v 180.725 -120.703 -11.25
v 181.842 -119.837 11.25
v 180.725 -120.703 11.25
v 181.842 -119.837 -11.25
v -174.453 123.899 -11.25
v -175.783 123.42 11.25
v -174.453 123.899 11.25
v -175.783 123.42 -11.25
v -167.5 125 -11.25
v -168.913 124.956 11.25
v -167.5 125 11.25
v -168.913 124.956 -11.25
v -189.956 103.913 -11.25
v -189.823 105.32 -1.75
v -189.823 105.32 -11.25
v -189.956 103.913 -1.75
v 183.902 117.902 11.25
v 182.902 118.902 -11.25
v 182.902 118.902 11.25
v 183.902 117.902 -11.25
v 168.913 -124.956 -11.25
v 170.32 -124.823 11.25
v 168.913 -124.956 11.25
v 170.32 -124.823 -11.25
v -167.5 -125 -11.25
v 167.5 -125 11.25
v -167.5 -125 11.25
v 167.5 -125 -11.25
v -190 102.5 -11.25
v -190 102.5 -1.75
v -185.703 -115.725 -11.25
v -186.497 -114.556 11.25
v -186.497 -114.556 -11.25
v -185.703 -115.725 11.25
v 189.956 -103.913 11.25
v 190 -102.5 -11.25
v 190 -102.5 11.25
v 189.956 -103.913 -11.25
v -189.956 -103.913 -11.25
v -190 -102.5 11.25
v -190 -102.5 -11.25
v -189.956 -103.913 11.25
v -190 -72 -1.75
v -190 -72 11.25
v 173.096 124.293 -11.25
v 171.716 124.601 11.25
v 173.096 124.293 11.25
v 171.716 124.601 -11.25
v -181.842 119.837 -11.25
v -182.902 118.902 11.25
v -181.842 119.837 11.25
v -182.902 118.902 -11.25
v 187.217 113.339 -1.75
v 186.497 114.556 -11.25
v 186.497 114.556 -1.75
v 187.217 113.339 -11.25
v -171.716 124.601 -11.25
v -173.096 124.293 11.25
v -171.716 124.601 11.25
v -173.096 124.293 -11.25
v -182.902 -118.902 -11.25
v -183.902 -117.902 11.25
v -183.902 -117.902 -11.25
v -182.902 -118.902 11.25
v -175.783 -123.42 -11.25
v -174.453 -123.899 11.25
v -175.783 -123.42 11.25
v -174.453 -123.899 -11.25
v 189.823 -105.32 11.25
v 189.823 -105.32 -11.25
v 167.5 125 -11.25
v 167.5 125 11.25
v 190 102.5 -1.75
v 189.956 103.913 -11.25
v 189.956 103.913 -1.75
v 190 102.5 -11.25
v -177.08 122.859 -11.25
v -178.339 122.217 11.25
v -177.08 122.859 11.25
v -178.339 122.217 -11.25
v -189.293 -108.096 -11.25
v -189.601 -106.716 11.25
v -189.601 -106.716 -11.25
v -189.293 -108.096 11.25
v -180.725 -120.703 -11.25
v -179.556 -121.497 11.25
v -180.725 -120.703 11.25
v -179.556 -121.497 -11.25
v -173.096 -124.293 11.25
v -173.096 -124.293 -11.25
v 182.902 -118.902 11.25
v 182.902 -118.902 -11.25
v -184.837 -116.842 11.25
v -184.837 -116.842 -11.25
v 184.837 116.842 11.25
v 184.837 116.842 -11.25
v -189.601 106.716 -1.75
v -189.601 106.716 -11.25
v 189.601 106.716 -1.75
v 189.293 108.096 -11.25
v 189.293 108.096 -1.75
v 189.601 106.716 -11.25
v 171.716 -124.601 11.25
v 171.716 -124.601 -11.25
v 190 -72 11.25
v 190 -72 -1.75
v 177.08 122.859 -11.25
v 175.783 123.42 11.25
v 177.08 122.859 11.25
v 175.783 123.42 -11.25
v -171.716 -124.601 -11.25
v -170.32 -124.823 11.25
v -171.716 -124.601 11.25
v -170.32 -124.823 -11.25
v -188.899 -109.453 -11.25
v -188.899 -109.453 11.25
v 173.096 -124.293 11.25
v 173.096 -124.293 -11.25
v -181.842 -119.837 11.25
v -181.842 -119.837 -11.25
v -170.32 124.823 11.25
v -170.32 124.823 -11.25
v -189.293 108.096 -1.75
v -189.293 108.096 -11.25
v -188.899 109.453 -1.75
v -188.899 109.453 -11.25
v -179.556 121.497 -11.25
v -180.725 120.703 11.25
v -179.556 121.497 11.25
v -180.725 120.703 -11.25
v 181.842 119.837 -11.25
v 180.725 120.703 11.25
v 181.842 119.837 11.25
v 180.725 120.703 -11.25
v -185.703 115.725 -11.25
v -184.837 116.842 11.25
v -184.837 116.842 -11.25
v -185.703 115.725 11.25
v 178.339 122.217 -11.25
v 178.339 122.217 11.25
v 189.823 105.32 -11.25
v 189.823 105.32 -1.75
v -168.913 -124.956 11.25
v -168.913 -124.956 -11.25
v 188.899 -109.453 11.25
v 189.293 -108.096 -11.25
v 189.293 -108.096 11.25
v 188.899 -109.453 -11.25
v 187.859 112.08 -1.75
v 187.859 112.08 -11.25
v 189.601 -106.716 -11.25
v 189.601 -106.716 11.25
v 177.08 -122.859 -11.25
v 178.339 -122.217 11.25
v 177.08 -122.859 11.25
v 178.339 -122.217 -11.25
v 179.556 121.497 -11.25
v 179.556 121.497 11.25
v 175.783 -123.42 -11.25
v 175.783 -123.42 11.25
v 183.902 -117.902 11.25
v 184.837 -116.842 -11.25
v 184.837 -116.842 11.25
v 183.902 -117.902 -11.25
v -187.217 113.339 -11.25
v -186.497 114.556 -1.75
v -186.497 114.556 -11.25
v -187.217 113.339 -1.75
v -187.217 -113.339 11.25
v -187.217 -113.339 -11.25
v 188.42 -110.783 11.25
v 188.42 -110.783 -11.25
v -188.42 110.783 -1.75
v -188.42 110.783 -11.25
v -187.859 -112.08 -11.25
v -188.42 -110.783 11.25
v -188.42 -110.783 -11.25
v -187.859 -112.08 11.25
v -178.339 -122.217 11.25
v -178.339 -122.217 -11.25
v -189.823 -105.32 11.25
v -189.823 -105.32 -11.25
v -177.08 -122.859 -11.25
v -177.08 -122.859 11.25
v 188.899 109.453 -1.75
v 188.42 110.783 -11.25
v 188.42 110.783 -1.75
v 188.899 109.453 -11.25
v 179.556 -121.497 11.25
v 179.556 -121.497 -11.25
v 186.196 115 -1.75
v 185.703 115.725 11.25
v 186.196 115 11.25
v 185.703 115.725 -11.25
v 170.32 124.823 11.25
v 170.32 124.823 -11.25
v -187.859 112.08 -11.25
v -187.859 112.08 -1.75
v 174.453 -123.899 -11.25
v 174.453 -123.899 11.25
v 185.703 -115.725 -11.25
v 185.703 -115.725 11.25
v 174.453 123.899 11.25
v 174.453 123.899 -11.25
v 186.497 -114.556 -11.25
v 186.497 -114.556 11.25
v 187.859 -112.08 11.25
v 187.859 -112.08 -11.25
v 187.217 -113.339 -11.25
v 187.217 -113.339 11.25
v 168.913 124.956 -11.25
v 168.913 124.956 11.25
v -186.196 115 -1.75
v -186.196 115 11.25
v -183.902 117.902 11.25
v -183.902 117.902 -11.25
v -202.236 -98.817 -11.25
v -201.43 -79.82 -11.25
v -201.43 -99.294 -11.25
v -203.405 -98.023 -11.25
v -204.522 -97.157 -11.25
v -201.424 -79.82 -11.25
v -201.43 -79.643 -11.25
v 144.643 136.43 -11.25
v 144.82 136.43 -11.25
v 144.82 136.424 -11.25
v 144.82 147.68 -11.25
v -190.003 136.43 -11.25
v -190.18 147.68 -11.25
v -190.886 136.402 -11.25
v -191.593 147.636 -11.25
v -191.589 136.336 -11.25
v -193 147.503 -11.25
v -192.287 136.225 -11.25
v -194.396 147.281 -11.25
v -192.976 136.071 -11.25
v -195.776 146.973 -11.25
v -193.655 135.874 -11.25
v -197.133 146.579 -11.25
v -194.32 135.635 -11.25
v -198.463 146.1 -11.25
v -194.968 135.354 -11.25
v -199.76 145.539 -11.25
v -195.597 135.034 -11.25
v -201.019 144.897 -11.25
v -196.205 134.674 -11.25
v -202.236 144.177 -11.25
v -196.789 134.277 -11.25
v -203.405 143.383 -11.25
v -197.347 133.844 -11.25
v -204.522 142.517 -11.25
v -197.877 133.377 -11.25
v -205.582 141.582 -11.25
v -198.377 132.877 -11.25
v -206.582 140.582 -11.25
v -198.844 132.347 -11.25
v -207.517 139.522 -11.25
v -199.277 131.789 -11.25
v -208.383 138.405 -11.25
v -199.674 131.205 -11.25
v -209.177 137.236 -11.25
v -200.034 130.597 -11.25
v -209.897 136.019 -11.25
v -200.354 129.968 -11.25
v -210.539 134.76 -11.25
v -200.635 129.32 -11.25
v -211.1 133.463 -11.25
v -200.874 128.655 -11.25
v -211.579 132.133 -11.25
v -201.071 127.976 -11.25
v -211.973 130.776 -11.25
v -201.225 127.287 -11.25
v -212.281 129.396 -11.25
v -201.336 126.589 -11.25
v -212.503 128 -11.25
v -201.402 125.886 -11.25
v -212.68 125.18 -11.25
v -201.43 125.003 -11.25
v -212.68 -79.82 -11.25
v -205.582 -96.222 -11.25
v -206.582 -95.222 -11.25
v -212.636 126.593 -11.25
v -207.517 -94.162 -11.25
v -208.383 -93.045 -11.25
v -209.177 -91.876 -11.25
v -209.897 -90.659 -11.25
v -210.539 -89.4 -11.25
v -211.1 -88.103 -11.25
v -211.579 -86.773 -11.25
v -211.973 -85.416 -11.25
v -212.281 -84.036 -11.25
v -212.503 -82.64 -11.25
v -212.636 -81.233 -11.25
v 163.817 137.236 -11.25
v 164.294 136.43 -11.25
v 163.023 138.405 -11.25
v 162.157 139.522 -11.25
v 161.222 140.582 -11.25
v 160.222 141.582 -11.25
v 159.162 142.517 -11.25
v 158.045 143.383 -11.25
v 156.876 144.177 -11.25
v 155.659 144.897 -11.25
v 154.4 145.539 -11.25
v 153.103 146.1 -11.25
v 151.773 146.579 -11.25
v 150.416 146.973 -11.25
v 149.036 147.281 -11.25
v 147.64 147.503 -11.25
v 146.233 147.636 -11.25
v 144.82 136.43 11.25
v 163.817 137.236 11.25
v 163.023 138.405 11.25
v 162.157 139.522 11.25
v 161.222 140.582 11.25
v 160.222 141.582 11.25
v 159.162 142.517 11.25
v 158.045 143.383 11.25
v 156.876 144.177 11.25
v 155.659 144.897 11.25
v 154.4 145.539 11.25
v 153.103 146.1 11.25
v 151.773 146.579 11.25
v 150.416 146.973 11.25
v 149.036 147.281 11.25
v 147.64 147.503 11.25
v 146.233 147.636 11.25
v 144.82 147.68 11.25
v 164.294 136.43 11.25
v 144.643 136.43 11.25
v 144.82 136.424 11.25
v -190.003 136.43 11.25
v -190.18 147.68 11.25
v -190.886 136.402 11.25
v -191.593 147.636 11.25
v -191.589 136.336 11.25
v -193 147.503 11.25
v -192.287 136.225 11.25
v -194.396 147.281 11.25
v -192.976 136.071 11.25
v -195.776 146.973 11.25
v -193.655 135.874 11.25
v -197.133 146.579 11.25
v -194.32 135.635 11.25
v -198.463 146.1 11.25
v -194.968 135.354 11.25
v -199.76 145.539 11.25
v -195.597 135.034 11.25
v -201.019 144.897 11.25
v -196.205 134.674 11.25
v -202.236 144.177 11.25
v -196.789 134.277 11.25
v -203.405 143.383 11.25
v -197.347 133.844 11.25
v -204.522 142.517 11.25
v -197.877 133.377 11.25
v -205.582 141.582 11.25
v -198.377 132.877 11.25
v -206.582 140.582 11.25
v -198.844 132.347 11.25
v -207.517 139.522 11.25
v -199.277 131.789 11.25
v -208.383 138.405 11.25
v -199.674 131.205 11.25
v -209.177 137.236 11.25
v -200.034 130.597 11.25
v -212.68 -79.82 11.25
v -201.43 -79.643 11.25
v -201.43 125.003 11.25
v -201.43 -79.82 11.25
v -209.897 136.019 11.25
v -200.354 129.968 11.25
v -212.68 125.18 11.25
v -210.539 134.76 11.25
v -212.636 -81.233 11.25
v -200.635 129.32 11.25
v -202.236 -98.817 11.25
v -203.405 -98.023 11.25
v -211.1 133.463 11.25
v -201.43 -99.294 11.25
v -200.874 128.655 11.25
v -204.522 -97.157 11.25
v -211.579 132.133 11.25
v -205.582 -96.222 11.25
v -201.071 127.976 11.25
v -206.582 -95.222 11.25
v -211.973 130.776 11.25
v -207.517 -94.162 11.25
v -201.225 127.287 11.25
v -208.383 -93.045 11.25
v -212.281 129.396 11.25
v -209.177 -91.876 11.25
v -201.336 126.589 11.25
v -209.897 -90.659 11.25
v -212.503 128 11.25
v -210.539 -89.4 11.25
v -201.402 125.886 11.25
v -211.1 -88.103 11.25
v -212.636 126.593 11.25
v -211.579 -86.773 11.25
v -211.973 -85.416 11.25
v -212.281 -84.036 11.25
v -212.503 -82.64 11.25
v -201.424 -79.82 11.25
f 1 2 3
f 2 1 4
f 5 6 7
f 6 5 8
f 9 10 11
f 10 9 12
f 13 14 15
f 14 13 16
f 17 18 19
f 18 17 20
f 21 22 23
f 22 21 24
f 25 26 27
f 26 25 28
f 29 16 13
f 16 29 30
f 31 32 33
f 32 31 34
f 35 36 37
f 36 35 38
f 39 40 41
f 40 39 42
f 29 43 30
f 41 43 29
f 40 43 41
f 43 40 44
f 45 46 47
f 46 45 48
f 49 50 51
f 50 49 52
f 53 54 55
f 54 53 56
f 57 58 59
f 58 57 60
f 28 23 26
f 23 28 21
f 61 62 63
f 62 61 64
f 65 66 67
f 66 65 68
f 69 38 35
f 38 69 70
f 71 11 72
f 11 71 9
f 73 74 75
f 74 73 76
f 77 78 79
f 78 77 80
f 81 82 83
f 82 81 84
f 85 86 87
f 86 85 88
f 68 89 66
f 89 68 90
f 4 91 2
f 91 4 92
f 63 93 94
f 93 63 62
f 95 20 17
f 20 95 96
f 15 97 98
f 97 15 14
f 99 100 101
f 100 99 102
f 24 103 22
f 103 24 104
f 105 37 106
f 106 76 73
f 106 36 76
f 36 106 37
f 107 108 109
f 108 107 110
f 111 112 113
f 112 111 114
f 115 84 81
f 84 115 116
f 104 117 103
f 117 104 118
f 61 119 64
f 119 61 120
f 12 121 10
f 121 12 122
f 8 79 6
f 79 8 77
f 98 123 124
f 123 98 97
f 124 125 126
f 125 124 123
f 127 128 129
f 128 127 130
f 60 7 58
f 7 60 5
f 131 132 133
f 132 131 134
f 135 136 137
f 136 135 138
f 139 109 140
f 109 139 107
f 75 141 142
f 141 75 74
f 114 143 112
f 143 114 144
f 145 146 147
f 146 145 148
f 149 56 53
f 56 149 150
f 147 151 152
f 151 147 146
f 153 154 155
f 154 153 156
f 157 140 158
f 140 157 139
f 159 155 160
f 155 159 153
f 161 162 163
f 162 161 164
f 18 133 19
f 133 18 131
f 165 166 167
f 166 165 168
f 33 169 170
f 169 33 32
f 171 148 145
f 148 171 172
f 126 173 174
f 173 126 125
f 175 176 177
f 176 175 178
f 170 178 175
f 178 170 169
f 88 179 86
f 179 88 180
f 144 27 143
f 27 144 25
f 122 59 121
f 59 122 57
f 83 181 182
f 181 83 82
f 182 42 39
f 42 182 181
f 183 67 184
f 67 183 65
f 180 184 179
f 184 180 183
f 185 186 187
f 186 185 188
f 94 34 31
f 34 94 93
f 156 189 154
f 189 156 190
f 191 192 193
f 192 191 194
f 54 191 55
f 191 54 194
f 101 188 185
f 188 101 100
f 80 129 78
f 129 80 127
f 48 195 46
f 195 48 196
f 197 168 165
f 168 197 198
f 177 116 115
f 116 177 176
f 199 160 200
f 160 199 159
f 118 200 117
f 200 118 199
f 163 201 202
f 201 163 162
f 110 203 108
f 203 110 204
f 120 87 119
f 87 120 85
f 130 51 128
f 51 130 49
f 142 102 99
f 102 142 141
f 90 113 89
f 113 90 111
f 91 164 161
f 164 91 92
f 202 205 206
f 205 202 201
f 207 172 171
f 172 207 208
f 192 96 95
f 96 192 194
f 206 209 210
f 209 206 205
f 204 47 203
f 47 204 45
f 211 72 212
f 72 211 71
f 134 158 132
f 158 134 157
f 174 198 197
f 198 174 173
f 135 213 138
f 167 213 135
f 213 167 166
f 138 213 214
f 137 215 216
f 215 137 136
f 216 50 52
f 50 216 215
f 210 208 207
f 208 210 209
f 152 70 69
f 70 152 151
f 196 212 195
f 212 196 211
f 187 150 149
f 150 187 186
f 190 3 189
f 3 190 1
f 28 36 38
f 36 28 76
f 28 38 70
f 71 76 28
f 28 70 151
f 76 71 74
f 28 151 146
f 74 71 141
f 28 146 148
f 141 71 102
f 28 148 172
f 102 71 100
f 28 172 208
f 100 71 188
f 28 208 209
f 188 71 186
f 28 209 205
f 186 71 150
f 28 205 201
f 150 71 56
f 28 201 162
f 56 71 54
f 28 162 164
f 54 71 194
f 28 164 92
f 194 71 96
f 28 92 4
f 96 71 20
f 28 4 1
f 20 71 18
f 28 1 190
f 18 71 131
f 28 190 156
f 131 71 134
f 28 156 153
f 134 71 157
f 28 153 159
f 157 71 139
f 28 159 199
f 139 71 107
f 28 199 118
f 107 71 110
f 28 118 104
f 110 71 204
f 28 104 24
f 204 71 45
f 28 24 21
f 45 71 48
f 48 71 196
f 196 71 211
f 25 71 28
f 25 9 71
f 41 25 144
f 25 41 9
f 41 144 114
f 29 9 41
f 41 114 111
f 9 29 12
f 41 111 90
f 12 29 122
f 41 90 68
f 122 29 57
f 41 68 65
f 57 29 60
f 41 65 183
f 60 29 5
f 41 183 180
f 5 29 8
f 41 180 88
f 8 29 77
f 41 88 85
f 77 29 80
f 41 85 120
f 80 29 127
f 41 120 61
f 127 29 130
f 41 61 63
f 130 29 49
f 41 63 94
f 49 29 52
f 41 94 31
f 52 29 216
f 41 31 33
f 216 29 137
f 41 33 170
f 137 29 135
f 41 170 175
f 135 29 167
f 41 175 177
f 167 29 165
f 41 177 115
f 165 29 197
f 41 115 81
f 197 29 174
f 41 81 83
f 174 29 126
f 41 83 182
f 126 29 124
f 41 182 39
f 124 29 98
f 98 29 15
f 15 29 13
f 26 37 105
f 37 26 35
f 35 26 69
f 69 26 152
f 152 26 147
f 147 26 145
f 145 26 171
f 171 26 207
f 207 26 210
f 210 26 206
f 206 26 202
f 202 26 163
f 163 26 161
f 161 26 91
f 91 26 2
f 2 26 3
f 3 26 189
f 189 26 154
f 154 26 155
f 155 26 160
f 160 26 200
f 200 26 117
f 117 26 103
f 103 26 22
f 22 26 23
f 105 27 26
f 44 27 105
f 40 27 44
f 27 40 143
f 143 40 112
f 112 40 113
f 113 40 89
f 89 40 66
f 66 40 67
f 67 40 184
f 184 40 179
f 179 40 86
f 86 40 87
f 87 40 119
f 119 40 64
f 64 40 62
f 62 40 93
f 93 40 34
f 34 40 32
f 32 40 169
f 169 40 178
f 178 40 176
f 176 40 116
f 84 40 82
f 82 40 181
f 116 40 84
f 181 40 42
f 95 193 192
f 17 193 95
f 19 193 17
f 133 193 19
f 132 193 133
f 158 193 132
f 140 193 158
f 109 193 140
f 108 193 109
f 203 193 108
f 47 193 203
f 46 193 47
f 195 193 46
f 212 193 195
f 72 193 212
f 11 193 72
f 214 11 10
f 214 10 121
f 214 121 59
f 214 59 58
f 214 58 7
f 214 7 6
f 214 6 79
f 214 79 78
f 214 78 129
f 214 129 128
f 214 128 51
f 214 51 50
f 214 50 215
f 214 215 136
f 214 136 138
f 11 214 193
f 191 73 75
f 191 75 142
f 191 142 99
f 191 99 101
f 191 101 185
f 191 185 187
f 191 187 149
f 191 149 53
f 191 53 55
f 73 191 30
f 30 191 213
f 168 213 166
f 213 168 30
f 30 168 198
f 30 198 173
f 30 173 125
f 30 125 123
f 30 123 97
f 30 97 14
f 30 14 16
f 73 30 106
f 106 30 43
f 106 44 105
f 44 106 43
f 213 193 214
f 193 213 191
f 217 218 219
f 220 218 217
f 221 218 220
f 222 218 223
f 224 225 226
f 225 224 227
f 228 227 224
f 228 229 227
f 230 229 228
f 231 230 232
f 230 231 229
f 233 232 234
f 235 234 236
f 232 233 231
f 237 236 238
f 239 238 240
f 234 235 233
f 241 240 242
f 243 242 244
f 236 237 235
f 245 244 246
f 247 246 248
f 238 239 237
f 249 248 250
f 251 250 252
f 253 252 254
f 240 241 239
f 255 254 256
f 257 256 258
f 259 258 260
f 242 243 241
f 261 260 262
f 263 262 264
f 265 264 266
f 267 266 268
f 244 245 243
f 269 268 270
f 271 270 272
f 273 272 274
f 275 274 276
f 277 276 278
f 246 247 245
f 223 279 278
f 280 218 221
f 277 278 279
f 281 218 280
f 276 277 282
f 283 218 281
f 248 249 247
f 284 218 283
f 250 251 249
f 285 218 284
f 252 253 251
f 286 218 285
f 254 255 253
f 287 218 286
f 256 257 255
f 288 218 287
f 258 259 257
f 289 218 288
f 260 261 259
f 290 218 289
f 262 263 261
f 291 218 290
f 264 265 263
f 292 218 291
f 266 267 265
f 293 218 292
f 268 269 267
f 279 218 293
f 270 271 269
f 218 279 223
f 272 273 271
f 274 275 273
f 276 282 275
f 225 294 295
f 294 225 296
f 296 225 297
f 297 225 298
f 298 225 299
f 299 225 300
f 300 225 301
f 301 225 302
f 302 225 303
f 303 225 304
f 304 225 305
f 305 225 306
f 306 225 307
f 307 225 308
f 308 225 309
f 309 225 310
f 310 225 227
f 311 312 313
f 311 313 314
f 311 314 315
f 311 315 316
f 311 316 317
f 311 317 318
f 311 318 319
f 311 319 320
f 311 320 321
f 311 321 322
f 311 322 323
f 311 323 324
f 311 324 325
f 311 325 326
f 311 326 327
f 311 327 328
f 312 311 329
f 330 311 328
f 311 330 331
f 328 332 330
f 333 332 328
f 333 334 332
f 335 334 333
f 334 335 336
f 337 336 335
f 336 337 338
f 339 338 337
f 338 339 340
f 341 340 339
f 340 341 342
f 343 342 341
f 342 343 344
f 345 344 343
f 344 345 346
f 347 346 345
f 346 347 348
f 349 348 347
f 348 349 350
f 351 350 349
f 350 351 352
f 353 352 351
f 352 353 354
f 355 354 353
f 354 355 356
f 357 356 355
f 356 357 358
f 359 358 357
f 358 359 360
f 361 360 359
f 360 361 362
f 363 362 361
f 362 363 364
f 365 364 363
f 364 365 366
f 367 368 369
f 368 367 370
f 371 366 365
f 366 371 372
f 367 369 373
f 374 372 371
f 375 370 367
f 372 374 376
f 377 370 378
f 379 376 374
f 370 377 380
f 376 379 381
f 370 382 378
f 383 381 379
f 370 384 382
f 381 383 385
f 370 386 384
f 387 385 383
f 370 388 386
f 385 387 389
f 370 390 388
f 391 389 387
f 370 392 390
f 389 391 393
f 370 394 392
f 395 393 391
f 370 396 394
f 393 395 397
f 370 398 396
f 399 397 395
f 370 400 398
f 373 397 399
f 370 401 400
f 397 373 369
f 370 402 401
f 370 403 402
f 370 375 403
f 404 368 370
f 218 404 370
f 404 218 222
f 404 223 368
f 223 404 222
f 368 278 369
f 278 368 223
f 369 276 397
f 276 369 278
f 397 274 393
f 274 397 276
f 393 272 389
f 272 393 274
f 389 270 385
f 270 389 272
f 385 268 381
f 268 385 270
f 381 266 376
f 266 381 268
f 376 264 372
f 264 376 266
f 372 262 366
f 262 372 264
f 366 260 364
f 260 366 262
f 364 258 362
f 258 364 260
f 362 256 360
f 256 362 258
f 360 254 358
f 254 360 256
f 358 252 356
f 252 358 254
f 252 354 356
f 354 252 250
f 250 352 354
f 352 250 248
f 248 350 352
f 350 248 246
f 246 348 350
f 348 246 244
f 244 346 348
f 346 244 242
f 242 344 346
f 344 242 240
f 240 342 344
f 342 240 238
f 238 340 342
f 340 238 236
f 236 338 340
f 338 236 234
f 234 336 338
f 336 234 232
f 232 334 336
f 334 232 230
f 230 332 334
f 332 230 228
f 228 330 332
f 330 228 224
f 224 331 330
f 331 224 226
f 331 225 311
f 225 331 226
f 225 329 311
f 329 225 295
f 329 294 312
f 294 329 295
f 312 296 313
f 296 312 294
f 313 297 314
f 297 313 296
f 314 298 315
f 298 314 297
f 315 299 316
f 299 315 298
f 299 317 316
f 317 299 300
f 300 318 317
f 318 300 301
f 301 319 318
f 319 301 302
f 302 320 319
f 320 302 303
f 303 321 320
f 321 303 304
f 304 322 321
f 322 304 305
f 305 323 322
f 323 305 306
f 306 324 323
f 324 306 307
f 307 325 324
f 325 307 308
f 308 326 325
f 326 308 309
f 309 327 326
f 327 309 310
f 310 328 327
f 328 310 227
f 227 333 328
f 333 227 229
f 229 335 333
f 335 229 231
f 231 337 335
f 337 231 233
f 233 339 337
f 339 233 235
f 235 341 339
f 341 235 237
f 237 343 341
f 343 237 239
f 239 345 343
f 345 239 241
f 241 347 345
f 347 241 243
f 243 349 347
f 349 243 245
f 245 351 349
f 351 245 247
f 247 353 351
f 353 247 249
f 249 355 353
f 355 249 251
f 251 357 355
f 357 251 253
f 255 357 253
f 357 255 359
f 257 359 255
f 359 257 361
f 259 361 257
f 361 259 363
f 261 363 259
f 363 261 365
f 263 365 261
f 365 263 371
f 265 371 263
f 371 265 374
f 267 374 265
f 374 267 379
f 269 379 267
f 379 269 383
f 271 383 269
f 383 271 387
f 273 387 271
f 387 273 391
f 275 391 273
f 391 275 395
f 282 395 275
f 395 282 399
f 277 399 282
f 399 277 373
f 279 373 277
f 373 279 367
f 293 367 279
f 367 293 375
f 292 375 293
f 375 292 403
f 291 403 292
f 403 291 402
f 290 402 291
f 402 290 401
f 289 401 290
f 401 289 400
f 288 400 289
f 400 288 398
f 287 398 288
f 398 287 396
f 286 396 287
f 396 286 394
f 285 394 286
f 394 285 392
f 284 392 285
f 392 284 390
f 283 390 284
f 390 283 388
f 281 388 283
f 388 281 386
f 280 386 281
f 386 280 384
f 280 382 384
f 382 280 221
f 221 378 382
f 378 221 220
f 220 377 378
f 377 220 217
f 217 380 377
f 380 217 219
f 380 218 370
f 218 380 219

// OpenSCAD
// file: ../extensions/rounded_cube.scad
use <rounded_square.scad>

// Extrude version of rounded square
//
// It does not round in Z dimension. That's because my most
// common use is really an extruded rounded square than a
// fully rounded cube.
module rounded_cube(dimensions, radius = 1, center=false) {
  linear_extrude(dimensions.z, center=center)
    rounded_square(dimensions, radius, center=center);
}
// file: ../extensions/rounded_square.scad
// Square with rounded borders
//
// If the border radius is a single number, all borders will have the
// same radius. Optionally, it can be a list with a radius for each
// corner (starting from bottom left and counting clockwise).
//
// If any radius is zero, that corner will be sharp.
module rounded_square(dimensions, radius = 1, center=false) {
  r = is_list(radius) ? radius : [radius, radius, radius, radius];

  translation = center ? -dimensions / 2 : [0, 0];

  translate(translation) {
    hull() {
      if (r[0] > 0)
        translate([r[0], r[0]]) circle(r[0]);
      else
        square(1);

      if (r[1] > 0)
        translate([r[1], dimensions.y - r[1]]) circle(r[1]);
      else
        translate([0, dimensions.y - 1]) square(1);

      if (r[2] > 0)
        translate([dimensions.x - r[2], dimensions.y - r[2]]) circle(r[2]);
      else
        translate([dimensions.x - 1, dimensions.y - 1]) square(1);

      if (r[3] > 0)
        translate([dimensions.x - r[3], r[3]]) circle(r[3]);
      else
        translate([dimensions.x - 1, 0]) square(1);
    }
  }
}
// file: ../extensions/mirror_translate.scad
// Mirrors the object translation
module mirror_translate(translation, copy=true) {
  if (copy) translate(translation) children();
  // mirror only what we moved
  m = [for (e = translation) e != 0 ? 1 : 0];
  mirror(m) translate(translation) children();
}
// main file
use <../extensions/mirror_translate.scad>
use <../extensions/rounded_square.scad>
use <../extensions/rounded_cube.scad>

$fn = 100;
INCH = 25.4;
bit_diameter = 1/4 * INCH;

// test material 53 height;
thickness = 22.5;
width = 380;
depth = 250;
rounded_corner_radius = thickness;
border_distance = 10;

fence_height = thickness;
fence_thickness = thickness / 2;
gap_depth = 187;
gap_height = 13;

module base_slab() {
  rounded_cube([width, depth, thickness], rounded_corner_radius, center=true);
}

module base_gap() {
 translate([0, -depth / 2 + gap_depth / 2 + border_distance, -thickness + gap_height])
   cube([width + 1, gap_depth, thickness], center= true);
}

module base () {
  difference() {
    base_slab();
    base_gap();
  }
}

module fence() {
  linear_extrude(fence_height, center=true) {
    difference() {
      rounded_square([width, depth], rounded_corner_radius, center=true);
      offset(-fence_thickness) rounded_square([width, depth], rounded_corner_radius, center=true);
      translate([fence_thickness, -depth / 2]) square([width, thickness * 2], center=true);
      translate([width / 2, -fence_thickness]) square([thickness * 2, depth], center=true);
    }
  }
}

module assembled() {
  base();
  translate([0, 0, thickness]) fence();
}

module flat_pack() {
  rotate([180, 0, 0]) base();
  translate([-(fence_thickness + 1.8 * bit_diameter), fence_thickness + 1.8 * bit_diameter, 0]) fence();
}

assembled();
!flat_pack();
